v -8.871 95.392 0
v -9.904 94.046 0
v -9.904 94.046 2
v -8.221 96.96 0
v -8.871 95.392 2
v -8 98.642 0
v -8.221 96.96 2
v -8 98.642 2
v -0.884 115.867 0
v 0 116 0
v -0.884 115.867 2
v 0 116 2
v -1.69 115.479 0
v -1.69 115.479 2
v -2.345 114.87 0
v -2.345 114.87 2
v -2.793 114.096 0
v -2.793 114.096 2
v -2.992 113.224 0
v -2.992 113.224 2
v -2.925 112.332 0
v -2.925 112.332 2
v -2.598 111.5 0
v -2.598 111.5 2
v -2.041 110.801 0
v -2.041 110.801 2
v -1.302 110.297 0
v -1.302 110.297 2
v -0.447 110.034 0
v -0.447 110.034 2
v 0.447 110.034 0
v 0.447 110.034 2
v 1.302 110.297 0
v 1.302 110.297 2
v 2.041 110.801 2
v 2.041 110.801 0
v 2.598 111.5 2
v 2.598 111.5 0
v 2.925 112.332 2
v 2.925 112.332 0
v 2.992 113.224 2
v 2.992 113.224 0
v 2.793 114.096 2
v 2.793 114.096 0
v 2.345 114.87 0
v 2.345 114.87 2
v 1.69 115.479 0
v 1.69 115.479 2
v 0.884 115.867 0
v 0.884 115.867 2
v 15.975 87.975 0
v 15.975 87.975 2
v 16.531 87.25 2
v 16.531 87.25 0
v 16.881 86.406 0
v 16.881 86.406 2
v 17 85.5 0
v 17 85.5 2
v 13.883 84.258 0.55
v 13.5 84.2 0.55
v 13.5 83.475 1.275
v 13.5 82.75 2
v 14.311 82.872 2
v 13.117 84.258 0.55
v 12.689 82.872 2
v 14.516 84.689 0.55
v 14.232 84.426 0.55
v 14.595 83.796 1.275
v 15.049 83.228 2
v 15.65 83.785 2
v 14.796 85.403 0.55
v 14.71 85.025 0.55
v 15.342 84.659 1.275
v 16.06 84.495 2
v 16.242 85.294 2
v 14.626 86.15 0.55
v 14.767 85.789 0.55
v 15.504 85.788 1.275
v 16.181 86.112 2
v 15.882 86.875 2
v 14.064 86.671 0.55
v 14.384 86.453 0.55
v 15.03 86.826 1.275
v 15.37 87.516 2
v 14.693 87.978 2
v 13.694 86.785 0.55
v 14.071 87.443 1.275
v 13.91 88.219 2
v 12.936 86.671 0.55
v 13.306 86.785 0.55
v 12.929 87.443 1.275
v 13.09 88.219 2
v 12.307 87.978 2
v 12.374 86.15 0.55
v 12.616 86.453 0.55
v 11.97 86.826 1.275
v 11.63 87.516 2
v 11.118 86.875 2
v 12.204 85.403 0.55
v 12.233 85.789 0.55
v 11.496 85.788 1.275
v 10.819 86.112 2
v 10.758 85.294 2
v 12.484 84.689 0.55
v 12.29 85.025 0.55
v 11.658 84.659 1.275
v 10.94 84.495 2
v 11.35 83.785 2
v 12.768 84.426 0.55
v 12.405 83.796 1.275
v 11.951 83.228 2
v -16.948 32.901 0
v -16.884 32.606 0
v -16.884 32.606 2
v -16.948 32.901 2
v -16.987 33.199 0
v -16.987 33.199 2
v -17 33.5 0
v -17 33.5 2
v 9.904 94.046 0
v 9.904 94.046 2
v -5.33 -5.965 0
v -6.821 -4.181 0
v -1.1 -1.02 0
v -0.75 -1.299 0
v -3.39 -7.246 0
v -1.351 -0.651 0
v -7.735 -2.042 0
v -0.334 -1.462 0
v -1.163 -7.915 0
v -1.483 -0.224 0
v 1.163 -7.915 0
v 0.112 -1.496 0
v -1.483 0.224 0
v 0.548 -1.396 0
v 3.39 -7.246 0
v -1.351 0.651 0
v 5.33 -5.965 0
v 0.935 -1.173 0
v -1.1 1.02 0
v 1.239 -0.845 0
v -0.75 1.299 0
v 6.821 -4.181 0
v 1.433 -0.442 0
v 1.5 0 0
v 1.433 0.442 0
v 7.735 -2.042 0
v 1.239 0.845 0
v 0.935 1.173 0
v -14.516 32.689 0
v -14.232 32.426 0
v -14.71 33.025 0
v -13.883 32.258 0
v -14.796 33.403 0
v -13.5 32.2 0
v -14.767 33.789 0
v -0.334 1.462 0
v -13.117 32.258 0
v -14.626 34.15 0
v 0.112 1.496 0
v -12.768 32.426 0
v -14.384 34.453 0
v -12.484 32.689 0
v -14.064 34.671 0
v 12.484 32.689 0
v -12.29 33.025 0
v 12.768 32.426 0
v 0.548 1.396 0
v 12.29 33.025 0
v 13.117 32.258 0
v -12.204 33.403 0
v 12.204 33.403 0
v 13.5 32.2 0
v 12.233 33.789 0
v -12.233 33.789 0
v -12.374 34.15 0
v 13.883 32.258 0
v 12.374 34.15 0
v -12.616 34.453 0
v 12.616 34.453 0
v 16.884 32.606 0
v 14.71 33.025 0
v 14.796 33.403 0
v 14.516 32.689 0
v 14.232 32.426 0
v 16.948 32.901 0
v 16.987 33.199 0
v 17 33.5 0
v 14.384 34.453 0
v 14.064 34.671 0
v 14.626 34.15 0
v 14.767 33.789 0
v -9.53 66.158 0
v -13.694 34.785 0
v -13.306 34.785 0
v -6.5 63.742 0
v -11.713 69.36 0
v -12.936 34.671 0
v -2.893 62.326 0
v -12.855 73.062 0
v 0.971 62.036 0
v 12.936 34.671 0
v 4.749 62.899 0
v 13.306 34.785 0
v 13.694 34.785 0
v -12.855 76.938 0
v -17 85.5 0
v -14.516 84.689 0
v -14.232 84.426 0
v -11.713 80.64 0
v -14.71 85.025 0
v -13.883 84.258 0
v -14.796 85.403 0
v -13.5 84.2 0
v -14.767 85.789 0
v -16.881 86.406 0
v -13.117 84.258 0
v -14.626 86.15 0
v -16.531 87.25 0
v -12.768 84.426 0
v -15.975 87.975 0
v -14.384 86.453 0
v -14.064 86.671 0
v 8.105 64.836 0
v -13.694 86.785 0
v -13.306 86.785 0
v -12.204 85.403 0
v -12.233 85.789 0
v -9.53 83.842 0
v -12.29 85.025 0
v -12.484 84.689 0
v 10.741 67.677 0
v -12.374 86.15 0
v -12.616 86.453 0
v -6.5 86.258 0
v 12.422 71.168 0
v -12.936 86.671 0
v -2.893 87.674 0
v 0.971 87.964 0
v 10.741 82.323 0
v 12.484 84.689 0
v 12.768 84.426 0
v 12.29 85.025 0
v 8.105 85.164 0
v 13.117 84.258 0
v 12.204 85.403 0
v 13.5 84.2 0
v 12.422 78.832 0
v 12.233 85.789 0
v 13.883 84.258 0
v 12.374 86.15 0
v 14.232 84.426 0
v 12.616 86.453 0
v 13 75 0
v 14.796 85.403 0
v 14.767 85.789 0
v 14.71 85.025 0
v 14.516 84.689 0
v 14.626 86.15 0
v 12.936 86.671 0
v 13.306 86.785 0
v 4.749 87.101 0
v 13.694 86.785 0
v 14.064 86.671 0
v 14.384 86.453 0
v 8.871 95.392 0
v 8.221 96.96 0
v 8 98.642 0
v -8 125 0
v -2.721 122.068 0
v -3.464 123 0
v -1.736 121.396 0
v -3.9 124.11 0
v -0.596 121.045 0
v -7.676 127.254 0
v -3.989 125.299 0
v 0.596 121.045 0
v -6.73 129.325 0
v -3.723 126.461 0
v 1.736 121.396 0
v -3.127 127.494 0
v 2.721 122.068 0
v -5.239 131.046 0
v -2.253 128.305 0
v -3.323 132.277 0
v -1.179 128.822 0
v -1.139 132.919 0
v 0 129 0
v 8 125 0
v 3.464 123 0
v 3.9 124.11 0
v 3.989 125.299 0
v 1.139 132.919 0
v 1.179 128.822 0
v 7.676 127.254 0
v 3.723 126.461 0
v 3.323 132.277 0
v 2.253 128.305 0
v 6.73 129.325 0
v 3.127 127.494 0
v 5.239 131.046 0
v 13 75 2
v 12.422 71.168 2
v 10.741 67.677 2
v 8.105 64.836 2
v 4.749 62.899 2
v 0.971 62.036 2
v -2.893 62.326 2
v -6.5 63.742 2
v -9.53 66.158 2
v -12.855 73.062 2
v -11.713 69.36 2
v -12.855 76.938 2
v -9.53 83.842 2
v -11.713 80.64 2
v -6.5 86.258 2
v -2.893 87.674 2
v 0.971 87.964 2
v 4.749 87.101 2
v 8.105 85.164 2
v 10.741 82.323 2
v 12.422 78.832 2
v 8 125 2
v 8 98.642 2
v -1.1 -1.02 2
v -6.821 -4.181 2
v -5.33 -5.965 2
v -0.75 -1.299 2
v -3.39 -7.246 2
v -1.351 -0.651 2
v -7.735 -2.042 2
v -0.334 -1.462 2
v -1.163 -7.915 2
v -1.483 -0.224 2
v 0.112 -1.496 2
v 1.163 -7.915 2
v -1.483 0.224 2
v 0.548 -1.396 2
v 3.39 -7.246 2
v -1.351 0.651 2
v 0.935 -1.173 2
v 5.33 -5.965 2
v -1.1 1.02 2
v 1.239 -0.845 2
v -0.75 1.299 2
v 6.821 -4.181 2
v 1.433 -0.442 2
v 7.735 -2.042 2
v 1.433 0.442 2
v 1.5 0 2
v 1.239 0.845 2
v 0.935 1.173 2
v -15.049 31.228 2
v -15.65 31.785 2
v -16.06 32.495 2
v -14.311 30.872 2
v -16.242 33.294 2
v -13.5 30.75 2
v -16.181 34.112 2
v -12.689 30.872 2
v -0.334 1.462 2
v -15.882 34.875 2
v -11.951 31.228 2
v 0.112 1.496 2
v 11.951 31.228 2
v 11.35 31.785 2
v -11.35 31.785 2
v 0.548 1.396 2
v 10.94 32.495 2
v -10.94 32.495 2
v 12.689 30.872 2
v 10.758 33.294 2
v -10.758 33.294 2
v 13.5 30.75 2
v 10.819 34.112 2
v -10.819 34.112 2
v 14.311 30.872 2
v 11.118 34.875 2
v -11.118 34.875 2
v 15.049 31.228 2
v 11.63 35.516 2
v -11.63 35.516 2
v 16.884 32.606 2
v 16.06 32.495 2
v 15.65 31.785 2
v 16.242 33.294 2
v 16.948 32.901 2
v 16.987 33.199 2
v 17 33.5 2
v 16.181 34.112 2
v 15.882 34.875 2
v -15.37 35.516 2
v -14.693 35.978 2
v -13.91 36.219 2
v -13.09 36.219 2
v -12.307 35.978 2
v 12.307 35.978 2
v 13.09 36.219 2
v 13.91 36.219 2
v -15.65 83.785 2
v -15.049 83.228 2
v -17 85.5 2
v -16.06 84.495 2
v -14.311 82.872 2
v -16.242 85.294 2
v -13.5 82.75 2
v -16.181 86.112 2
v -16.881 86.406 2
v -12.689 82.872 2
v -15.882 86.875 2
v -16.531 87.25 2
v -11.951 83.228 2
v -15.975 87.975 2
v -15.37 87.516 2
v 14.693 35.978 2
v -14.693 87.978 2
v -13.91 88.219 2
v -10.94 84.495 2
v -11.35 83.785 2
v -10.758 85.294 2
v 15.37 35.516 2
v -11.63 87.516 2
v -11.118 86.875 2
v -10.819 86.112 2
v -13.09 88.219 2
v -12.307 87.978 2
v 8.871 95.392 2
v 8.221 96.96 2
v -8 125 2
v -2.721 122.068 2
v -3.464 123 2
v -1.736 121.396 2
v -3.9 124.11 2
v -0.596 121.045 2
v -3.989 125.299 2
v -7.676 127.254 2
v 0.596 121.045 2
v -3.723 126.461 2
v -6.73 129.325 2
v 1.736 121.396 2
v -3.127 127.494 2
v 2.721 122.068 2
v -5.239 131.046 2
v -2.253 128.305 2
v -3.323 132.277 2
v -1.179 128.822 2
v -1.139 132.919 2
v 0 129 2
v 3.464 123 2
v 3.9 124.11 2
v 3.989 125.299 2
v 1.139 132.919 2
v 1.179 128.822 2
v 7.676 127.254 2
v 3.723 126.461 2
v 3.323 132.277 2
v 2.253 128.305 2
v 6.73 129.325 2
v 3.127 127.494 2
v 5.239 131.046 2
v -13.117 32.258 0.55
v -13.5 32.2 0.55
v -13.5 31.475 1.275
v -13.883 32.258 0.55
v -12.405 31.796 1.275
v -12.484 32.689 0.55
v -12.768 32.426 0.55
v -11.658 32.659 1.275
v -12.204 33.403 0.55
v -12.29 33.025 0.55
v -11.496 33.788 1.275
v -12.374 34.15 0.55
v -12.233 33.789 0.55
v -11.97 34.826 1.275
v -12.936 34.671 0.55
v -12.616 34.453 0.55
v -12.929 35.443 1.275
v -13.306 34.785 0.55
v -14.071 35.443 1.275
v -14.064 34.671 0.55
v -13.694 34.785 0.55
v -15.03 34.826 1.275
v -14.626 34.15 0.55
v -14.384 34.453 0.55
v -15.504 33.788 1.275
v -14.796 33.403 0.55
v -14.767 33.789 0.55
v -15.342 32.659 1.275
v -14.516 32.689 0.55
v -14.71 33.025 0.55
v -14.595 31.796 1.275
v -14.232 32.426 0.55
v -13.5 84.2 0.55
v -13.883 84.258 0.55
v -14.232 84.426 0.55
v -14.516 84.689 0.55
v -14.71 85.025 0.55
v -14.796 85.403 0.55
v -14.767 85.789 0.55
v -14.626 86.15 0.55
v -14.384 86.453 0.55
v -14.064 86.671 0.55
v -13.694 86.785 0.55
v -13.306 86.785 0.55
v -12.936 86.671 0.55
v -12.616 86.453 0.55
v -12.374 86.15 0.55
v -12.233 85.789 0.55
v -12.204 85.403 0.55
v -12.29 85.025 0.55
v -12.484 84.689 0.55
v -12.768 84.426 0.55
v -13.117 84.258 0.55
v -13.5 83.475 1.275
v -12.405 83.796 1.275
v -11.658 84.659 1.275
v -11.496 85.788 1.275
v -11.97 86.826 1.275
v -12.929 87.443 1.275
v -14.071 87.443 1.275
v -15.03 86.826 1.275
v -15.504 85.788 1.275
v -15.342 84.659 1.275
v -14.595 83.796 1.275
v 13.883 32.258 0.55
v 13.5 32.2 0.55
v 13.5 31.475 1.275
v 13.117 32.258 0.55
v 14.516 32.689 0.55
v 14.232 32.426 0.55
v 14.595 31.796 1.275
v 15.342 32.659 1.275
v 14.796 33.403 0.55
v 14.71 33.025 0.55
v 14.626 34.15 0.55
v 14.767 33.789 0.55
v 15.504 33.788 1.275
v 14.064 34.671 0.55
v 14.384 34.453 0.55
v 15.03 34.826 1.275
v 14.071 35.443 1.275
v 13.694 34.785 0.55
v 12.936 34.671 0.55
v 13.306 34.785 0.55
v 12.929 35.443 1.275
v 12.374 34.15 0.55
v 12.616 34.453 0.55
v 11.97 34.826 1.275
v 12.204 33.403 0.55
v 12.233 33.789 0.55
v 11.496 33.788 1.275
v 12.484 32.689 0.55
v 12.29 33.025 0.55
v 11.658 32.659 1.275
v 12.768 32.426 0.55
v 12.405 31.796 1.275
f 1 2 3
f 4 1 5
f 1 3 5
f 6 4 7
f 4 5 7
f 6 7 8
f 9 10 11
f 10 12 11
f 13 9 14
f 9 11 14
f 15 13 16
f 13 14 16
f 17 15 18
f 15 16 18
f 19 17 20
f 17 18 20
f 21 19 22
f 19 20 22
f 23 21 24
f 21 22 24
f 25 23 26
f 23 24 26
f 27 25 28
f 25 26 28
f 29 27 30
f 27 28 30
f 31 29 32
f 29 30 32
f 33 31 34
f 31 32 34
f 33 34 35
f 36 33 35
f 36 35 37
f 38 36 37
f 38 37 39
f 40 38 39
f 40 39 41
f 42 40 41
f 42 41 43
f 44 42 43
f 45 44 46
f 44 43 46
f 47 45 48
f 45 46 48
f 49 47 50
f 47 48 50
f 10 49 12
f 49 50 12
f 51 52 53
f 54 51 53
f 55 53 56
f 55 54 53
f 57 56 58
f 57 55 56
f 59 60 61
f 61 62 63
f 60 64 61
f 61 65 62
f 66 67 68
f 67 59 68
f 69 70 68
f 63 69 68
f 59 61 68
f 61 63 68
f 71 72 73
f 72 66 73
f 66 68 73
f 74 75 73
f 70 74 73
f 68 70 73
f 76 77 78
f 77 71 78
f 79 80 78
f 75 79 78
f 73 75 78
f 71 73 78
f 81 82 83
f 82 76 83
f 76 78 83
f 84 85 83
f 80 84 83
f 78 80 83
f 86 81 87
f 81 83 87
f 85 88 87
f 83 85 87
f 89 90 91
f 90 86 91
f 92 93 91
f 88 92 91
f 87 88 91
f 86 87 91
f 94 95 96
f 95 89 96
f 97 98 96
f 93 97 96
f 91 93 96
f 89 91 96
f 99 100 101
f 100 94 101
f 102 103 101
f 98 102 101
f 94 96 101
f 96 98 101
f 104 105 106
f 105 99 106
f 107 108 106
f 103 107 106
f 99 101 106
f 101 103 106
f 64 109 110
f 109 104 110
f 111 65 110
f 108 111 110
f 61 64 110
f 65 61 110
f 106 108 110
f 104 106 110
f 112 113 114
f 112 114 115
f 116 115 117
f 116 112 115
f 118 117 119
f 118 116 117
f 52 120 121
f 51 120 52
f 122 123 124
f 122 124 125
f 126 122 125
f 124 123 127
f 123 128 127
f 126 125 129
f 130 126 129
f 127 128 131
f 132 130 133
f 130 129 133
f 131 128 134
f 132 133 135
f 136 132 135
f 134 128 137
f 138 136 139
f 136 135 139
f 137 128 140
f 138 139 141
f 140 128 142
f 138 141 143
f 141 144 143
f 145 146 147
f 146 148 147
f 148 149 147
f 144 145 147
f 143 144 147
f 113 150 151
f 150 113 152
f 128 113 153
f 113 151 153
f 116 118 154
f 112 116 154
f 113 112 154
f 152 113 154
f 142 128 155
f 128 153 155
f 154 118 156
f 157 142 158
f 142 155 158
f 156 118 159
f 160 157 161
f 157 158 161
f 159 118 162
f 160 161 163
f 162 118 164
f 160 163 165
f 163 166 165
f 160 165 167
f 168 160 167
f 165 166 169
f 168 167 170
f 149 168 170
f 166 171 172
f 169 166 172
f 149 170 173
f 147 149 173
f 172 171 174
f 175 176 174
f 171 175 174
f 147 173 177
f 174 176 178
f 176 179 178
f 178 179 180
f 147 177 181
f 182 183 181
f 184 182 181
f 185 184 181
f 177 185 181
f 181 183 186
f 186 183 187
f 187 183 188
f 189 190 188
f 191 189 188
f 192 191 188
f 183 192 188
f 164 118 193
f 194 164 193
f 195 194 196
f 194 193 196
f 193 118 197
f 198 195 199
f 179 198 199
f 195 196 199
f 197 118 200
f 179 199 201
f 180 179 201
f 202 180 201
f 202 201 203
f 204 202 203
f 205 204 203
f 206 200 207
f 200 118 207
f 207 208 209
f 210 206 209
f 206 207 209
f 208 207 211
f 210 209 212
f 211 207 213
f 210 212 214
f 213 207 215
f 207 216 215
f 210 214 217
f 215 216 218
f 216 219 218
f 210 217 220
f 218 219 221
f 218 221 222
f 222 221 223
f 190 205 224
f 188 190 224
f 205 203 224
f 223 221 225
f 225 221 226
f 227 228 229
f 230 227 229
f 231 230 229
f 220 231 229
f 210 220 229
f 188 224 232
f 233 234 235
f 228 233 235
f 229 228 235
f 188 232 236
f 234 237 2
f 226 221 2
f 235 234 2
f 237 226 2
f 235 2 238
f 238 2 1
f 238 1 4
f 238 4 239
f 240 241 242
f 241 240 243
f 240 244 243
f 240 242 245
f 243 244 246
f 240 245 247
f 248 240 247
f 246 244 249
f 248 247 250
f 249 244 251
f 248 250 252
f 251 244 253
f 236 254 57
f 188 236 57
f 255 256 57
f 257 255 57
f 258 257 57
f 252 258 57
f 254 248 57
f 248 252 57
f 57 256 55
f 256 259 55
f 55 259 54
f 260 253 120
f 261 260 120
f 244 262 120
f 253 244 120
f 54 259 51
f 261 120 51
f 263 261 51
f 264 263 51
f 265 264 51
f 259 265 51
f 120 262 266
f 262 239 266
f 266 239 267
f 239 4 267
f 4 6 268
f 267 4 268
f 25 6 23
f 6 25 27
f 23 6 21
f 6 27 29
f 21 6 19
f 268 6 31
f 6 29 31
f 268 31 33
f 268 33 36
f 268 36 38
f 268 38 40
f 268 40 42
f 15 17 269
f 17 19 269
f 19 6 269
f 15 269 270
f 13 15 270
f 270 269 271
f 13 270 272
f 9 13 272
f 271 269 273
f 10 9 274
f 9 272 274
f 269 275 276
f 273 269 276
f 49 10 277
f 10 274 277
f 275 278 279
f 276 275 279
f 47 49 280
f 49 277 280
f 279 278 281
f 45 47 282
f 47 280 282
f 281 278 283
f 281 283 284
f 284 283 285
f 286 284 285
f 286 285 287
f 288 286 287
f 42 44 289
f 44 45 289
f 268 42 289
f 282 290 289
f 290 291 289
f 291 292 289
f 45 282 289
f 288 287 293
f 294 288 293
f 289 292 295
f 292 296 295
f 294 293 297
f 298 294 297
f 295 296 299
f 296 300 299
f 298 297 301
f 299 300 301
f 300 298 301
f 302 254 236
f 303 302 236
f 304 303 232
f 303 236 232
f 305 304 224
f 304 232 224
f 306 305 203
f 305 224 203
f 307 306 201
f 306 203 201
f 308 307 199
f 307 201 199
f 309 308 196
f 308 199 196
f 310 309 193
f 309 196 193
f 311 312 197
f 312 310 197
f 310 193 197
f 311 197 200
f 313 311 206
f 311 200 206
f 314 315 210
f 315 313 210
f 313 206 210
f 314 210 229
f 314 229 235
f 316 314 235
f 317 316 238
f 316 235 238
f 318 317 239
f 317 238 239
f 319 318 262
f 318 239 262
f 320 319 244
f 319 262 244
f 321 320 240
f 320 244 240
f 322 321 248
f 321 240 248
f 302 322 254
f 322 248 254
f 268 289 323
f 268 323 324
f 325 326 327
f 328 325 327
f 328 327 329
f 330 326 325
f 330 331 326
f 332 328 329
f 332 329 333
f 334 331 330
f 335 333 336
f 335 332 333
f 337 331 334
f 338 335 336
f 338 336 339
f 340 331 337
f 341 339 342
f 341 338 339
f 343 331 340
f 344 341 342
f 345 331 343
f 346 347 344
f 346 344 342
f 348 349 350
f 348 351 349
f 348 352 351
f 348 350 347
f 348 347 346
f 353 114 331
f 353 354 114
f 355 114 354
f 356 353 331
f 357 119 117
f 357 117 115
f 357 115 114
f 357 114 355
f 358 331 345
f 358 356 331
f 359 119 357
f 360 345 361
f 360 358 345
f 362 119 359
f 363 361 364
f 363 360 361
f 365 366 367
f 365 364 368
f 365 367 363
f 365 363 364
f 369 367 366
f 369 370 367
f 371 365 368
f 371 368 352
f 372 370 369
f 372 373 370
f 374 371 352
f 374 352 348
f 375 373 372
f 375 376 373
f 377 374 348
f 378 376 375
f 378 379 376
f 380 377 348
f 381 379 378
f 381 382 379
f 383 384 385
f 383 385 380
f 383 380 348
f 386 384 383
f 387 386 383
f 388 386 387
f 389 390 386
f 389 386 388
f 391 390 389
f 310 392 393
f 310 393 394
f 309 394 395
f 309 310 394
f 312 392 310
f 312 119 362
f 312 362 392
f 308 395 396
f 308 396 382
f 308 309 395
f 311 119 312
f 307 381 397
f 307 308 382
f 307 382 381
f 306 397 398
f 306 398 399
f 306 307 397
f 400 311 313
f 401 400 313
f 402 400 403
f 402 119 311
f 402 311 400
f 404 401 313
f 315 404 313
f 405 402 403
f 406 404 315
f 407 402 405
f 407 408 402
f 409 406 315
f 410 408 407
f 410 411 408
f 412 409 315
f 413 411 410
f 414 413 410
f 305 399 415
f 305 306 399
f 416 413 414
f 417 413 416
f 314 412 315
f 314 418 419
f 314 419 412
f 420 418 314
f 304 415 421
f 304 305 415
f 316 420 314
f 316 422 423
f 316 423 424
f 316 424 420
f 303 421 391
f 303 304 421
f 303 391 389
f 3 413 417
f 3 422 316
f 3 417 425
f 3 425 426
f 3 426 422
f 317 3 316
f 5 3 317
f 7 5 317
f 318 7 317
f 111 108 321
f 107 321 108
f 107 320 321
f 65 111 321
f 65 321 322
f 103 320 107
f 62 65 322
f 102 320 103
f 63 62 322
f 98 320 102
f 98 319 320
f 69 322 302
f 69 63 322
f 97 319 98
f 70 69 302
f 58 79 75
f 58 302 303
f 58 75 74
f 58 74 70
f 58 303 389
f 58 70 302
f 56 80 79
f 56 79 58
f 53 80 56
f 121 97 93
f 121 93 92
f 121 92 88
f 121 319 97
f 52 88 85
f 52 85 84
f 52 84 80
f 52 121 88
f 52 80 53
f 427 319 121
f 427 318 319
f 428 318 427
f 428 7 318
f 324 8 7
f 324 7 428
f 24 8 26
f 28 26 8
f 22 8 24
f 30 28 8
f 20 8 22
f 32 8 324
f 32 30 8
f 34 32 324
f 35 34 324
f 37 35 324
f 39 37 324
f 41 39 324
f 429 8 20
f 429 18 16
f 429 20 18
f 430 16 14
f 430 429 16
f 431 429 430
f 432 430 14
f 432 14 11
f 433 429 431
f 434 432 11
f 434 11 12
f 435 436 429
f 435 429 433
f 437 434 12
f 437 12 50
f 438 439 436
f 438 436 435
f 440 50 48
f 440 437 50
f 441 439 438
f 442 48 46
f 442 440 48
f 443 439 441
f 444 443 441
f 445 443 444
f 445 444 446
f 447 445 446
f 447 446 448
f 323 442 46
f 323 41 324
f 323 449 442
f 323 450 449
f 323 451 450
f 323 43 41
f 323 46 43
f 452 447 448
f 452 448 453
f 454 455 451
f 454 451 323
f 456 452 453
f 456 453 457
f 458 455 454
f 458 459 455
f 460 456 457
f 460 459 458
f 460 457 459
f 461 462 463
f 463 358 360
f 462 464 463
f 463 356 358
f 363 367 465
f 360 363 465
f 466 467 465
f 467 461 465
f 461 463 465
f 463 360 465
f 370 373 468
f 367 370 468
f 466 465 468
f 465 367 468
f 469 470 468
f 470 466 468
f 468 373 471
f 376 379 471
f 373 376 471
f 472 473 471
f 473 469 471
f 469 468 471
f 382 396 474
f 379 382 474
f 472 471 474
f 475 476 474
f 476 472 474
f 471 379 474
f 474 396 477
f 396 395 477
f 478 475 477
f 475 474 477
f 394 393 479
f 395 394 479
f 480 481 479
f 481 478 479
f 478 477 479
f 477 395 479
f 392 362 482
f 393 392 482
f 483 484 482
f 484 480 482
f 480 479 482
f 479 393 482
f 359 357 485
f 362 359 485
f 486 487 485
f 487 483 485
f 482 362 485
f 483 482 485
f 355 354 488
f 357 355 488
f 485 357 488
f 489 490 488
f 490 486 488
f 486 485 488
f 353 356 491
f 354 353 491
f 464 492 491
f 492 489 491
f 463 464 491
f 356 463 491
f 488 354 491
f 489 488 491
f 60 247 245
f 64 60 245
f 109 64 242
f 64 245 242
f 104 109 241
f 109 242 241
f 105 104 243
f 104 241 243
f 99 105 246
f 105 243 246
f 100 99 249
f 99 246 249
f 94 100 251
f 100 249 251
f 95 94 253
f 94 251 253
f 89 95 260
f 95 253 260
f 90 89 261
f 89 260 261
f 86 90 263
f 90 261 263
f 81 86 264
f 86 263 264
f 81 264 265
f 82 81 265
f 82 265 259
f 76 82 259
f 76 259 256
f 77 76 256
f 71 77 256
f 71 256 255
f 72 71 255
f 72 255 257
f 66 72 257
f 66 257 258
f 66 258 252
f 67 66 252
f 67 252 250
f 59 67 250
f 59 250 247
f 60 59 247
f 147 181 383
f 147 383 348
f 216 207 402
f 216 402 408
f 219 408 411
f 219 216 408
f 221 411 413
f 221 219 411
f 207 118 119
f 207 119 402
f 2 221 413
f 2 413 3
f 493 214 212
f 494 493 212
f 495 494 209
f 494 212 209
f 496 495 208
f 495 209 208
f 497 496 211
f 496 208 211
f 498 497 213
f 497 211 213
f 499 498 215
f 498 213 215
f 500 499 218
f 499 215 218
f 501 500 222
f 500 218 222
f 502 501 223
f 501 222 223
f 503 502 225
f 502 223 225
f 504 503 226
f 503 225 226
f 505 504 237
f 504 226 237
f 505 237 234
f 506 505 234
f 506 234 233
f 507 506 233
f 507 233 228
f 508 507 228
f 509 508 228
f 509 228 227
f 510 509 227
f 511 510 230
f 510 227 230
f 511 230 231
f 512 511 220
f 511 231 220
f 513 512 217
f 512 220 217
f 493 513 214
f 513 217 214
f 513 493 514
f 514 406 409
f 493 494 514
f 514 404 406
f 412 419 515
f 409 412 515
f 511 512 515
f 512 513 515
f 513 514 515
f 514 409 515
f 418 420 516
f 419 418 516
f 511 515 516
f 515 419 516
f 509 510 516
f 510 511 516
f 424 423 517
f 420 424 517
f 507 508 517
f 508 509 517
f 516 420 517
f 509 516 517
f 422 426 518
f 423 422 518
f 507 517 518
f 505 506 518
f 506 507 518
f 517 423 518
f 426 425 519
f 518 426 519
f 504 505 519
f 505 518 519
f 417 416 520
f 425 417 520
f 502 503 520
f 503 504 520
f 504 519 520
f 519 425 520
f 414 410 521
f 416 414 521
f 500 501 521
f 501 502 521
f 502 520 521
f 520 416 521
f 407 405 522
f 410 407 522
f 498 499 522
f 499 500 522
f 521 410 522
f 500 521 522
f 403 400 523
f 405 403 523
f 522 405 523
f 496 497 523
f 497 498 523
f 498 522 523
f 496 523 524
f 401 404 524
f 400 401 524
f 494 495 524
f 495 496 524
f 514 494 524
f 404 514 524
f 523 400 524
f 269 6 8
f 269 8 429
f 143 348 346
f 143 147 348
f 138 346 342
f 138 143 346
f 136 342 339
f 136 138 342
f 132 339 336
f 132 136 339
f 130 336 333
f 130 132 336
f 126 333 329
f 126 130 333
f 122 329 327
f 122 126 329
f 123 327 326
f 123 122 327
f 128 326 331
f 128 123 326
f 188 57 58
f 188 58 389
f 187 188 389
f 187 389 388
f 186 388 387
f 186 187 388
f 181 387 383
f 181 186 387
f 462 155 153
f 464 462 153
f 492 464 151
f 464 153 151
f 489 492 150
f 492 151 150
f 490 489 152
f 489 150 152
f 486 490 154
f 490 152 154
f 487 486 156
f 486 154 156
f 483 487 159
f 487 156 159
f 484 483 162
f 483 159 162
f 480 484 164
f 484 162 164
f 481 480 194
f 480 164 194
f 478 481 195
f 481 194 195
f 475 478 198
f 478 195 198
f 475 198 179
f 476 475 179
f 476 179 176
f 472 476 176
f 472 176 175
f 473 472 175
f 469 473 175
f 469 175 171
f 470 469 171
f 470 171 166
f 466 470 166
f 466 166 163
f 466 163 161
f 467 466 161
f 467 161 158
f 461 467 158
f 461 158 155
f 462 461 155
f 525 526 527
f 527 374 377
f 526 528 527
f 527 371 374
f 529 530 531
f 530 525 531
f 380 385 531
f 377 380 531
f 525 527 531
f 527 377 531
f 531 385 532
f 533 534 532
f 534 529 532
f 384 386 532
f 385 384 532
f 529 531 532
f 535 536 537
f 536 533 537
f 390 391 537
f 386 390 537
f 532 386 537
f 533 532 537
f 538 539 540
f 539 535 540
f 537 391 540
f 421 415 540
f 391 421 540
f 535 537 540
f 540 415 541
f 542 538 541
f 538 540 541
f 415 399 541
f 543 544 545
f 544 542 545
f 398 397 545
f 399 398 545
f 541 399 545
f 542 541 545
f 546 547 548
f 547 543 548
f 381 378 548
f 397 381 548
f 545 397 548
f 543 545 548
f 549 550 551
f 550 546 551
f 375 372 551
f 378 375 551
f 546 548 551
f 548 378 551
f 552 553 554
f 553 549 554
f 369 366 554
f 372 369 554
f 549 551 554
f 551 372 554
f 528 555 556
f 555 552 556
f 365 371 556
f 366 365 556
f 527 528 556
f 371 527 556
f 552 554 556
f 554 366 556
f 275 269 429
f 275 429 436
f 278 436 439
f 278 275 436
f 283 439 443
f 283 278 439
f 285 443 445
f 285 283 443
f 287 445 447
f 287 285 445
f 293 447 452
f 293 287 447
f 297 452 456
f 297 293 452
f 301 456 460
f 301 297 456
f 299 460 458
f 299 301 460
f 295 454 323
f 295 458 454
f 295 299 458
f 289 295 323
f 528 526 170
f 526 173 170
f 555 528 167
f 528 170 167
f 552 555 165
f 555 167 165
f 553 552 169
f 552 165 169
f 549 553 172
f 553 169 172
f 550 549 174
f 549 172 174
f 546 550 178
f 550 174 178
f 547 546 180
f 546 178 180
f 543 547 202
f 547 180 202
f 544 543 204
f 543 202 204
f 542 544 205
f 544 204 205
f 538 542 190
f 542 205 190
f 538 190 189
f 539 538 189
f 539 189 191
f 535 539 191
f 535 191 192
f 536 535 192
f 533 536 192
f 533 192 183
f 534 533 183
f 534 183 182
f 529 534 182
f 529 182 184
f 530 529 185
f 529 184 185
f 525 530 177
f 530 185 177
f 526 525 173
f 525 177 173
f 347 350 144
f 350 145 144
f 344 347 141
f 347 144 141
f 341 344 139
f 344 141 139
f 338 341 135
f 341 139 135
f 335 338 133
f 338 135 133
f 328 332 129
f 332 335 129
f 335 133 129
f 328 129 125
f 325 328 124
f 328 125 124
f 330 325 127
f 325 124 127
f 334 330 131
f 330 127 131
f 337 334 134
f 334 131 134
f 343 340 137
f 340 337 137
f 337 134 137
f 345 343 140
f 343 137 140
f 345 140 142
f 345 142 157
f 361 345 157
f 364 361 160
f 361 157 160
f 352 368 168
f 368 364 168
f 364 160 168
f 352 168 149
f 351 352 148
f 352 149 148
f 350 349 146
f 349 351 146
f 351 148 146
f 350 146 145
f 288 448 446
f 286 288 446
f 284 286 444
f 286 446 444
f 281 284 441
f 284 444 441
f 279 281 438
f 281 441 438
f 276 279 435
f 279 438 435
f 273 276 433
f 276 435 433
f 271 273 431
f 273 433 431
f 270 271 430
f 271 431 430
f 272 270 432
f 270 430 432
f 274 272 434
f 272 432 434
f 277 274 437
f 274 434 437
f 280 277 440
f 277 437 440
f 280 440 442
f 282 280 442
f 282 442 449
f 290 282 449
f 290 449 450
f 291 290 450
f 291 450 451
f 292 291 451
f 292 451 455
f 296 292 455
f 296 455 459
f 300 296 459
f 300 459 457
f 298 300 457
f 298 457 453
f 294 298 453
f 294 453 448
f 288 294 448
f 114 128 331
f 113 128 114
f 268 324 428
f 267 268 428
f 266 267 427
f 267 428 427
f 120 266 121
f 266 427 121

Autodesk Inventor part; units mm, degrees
ref_plane "YZ Plane" through (0, 0, 0) normal (1, 0, 0) x (0, 1, 0)
ref_plane "XZ Plane" through (0, 0, 0) normal (0, 1, 0) x (-1, 0, 0)
ref_plane "XY Plane" through (0, 0, 0) normal (0, 0, 1) x (1, 0, 0)
sketch "スケッチ1" plane through (0, 0, 0) normal (0, 0, 1) x (1, 0, 0)
  circle A0 centre (0, 0) radius 1.5
  circle A1 centre (13.5, 33.5) radius 1.25 construction
  circle A2 centre (13.5, 85.5) radius 1.25 construction
  circle A3 centre (-13.5, 85.5) radius 1.25 construction
  circle A4 centre (-13.5, 33.5) radius 1.25 construction
  circle A5 centre (0, 75) radius 1.5 construction
  circle A6 centre (0, 75) radius 13
  line L0 (16.884, 32.6064) -> (7.7349, -2.0424)
  line L1 (-7.7349, -2.0424) -> (-16.884, 32.6064)
  line L2 (-17, 33.5) -> (-17, 85.5)
  line L3 (-15.9749, 87.9749) -> (-8, 95.9497)
  line L4 (-8, 95.9497) -> (-8, 125)
  line L5 (8, 125) -> (8, 95.9497)
  line L6 (8, 95.9497) -> (15.9749, 87.9749)
  line L7 (17, 85.5) -> (17, 33.5)
  arc A7 (16.884, 32.6064) -> (17, 33.5) centre (13.5, 33.5) ccw
  arc A8 (17, 85.5) -> (15.9749, 87.9749) centre (13.5, 85.5) ccw
  arc A9 (-15.9749, 87.9749) -> (-17, 85.5) centre (-13.5, 85.5) ccw
  arc A10 (-17, 33.5) -> (-16.884, 32.6064) centre (-13.5, 33.5) ccw
  arc A11 (-7.7349, -2.0424) -> (7.7349, -2.0424) centre (0, 0) ccw
  line L8 (0, 0) -> (0, 152.1421) construction
  arc A12 (8, 125) -> (-8, 125) centre (0, 125) ccw
  point P0 (0, 113)
  dimension "d2" = 3
  dimension "d3" = 26
  dimension "d4" = 3.5
  dimension "d5" = 8
  dimension "d6" = 125
  dimension "d7" = 16
  dimension "d8" = 45
  dimension "d9" = 45
  dimension "d10" = 38
extrude "押し出し1" add sketch "スケッチ1" along normal blind 2
hole "穴2" at (0, 125, 0) direction (0, 0, 1) diameter 8 end through all
hole "穴3" at (0, 113, 0) direction (0, 0, 1) diameter 6 end through all
fillet "フィレット1" radius 6.5 2 edges at (-8, 95.9497, 1) (8, 95.9497, 1)
sketch "スケッチ2" plane through (0, 0, 2) normal (0, 0, 1) x (1, 0, 0)
  arc A0 (17, 85.5) -> (15.9749, 87.9749) centre (13.5, 85.5) ccw construction
  arc A1 (-15.9749, 87.9749) -> (-17, 85.5) centre (-13.5, 85.5) ccw construction
  arc A2 (-17, 33.5) -> (-16.884, 32.6064) centre (-13.5, 33.5) ccw construction
  arc A3 (16.884, 32.6064) -> (17, 33.5) centre (13.5, 33.5) ccw construction
  point P0 (0, 0)
hole "穴4" at (13.5, 85.5, 2) at (-13.5, 85.5, 2) at (-13.5, 33.5, 2) at (13.5, 33.5, 2) direction (0, 0, -1) diameter 2.6 end through all countersink diameter 5.5 countersink angle 90 clearance for "Countersunk Flat Head Screw ISO 2009/7046" size "M2.5" standard "ISO"
properties part number "UPPER_LEG_BASE"
